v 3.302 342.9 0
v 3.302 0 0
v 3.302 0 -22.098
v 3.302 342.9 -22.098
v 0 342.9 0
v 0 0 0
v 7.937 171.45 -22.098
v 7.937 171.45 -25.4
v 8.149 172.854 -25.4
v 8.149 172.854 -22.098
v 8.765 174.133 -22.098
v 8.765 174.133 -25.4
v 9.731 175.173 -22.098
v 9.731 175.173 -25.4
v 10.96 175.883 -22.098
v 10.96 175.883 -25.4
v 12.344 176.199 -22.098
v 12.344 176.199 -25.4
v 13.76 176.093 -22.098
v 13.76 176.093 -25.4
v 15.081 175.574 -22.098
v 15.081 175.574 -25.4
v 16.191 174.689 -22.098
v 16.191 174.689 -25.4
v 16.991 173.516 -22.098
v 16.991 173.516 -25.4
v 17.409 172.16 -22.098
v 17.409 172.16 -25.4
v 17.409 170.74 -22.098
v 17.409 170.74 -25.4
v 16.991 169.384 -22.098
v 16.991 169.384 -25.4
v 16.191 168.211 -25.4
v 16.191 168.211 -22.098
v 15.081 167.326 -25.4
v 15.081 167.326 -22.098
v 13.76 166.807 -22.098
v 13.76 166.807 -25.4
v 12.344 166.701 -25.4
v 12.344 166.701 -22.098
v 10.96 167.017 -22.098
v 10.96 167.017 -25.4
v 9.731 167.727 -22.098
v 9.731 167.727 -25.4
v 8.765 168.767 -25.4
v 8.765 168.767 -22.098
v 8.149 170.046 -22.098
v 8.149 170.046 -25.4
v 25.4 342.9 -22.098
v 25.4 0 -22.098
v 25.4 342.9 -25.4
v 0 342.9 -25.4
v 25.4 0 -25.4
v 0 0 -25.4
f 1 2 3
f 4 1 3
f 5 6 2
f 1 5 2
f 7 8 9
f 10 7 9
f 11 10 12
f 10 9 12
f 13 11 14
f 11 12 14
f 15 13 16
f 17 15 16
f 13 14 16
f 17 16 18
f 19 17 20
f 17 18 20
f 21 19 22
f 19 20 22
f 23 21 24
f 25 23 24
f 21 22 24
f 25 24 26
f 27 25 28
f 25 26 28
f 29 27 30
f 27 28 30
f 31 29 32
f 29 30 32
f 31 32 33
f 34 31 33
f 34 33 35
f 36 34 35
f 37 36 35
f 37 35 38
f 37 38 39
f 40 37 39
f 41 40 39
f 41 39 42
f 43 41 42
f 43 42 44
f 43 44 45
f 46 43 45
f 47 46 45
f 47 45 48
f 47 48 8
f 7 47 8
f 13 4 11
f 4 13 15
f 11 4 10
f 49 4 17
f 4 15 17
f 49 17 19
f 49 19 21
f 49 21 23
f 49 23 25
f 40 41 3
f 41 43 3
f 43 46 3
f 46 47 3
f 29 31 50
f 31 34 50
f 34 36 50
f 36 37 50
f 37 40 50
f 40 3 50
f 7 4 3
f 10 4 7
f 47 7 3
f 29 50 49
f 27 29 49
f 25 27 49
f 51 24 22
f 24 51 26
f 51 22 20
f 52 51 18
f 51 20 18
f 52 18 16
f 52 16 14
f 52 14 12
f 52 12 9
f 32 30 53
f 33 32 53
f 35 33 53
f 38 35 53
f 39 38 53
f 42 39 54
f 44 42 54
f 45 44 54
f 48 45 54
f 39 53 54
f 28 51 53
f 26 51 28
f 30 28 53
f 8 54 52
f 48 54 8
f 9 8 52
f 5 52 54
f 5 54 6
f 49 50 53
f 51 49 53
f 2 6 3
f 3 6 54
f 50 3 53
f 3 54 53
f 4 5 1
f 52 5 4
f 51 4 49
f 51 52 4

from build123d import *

# Parameters (mm, degrees)
BOSS_EXTRUDE1_DEPTH = 342.9
CUT_EXTRUDE1_REACH  = 346.776
SKETCH2_R           = 4.7625


with BuildPart() as part:
    # Sketch1 → Boss-Extrude1 (new body)
    with BuildSketch(Plane(origin=(0, 0, 0), x_dir=(1, 0, 0), z_dir=(0, 1, 0))):
        Polygon((0, 0), (3.302, 0), (3.302, 22.098), (25.4, 22.098), (25.4, 25.4), (0, 25.4), align=None)
    extrude(amount=BOSS_EXTRUDE1_DEPTH)

    # Sketch2 → Cut-Extrude1 (cut, up to next)
    with BuildSketch(Plane(origin=(0, 0, -25.4), x_dir=(-1, 0, 0), z_dir=(0, 0, -1)), mode=Mode.PRIVATE) as cut_extrude1_sk1:
        with Locations((-12.7, 171.45)):
            Circle(SKETCH2_R)
    cut_extrude1_tool1 = extrude(cut_extrude1_sk1.sketch, amount=-CUT_EXTRUDE1_REACH, mode=Mode.PRIVATE) & part.part
    add(cut_extrude1_tool1.solids().sort_by_distance((12.7, 171.45, -25.4))[0], mode=Mode.SUBTRACT)


solid = part.part
